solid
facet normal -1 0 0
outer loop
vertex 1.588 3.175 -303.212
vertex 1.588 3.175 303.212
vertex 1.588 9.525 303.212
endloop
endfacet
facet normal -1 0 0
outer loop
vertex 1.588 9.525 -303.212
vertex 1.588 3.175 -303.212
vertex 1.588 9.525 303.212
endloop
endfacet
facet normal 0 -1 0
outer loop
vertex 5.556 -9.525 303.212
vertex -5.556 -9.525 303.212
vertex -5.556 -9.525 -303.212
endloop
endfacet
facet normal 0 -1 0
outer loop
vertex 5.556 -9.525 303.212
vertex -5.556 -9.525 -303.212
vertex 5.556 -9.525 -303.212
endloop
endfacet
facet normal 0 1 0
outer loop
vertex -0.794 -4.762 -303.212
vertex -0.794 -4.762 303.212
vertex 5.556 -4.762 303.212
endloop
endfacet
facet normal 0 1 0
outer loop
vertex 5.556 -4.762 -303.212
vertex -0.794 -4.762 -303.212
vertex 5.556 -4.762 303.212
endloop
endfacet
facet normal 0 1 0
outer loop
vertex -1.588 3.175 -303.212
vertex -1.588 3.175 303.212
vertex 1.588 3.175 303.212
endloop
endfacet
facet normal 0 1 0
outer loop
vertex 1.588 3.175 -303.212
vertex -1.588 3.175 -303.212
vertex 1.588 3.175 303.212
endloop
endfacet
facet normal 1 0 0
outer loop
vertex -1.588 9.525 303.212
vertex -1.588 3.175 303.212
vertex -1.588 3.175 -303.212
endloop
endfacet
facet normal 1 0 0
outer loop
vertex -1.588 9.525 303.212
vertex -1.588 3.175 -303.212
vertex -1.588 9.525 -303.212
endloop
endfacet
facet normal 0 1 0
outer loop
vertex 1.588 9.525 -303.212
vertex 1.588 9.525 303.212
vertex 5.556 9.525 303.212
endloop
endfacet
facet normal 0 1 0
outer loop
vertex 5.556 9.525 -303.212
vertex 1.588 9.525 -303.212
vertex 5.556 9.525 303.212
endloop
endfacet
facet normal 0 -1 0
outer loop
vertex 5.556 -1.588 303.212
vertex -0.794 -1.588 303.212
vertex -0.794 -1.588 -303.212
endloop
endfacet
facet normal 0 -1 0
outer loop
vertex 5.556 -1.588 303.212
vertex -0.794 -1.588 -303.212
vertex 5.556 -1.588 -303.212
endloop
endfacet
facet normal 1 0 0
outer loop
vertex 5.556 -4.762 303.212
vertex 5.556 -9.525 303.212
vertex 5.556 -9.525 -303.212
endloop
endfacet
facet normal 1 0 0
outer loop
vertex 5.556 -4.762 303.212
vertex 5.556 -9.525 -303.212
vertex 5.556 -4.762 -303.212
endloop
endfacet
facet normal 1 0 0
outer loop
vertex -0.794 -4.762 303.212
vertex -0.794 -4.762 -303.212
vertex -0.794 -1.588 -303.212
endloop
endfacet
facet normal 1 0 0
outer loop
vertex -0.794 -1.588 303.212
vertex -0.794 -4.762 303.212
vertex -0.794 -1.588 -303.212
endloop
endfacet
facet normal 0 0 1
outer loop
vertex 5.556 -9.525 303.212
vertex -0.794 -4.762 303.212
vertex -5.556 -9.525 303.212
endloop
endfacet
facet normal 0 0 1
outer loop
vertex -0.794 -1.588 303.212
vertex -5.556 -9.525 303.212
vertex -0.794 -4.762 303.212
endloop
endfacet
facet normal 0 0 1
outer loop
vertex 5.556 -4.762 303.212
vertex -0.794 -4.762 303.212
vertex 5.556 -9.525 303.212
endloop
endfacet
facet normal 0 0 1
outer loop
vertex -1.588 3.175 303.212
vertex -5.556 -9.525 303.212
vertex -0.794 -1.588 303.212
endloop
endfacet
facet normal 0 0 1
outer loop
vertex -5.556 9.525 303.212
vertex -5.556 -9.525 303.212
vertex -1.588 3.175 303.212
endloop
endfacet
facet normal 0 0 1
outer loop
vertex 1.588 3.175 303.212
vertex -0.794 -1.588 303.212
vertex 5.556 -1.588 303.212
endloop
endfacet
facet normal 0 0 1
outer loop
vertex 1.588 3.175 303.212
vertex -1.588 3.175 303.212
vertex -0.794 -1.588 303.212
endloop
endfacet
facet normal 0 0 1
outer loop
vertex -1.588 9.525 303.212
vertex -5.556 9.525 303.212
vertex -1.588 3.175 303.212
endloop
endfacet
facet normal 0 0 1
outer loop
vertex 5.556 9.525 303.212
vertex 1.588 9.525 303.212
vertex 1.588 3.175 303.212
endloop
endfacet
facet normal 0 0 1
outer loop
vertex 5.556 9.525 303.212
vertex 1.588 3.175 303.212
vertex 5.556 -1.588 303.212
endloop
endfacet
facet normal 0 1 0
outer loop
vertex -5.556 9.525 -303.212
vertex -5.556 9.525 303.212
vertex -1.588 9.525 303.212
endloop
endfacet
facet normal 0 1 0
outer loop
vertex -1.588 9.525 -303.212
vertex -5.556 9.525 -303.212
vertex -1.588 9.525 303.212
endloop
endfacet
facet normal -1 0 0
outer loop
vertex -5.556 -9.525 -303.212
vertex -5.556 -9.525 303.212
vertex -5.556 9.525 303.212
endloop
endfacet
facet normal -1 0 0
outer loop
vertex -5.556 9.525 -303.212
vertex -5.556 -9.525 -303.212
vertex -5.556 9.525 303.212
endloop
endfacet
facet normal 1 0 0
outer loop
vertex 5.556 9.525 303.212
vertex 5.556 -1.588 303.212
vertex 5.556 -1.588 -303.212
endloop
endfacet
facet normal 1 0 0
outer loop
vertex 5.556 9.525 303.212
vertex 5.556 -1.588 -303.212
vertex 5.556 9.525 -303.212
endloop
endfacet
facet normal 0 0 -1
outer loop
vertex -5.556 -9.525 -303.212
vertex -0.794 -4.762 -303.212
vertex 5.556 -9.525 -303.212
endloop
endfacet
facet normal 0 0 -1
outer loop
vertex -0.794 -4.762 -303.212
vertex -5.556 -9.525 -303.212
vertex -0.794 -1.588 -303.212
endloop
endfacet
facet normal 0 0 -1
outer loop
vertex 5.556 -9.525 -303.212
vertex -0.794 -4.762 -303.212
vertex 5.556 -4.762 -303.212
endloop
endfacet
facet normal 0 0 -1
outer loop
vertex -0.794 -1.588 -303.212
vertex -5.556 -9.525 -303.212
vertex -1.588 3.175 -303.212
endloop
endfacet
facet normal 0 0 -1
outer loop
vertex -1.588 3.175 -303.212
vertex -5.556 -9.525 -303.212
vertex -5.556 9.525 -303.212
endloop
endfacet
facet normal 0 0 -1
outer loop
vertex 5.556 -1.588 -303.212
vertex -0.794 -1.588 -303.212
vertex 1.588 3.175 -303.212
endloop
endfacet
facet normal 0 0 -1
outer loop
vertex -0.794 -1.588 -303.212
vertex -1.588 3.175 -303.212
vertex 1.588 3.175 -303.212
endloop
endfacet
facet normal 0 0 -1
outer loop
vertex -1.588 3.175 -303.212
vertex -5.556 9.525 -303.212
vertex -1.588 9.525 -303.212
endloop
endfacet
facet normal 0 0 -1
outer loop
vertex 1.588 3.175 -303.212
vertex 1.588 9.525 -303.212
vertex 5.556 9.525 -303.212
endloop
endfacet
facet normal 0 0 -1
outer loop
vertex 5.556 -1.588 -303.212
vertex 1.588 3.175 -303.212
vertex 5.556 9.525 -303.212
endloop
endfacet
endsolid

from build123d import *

# Parameters (mm, degrees)
SKETCH1_W                            = 11.1125
SKETCH1_H                            = 19.05
WOOD_STRIP_DEPTH                     = 303.2125
SKETCH2_W                            = 3.175
SKETCH2_H                            = 6.35
SLOT_FOR_MOUNTING_TO_EXTRUSION_DEPTH = 607.425
SKETCH3_W                            = 6.35
SKETCH3_H                            = 3.175
SLOT_FOR_DIFFUSER_DEPTH              = 607.425


with BuildPart() as part:
    # Sketch1 → Wood Strip (new body, symmetric)
    with BuildSketch(Plane.XY):
        Rectangle(SKETCH1_W, SKETCH1_H)
    extrude(amount=WOOD_STRIP_DEPTH, both=True)

    # Sketch2 → Slot for Mounting to Extrusion (cut, through all)
    with BuildSketch(Plane.XY.offset(303.2125)):
        with Locations((0, 6.35)):
            Rectangle(SKETCH2_W, SKETCH2_H)
    extrude(amount=-SLOT_FOR_MOUNTING_TO_EXTRUSION_DEPTH, mode=Mode.SUBTRACT)

    # Sketch3 → Slot for Diffuser (cut, through all)
    with BuildSketch(Plane.XY.offset(303.2125)):
        with Locations((2.38125, -3.175)):
            Rectangle(SKETCH3_W, SKETCH3_H)
    extrude(amount=-SLOT_FOR_DIFFUSER_DEPTH, mode=Mode.SUBTRACT)


solid = part.part
